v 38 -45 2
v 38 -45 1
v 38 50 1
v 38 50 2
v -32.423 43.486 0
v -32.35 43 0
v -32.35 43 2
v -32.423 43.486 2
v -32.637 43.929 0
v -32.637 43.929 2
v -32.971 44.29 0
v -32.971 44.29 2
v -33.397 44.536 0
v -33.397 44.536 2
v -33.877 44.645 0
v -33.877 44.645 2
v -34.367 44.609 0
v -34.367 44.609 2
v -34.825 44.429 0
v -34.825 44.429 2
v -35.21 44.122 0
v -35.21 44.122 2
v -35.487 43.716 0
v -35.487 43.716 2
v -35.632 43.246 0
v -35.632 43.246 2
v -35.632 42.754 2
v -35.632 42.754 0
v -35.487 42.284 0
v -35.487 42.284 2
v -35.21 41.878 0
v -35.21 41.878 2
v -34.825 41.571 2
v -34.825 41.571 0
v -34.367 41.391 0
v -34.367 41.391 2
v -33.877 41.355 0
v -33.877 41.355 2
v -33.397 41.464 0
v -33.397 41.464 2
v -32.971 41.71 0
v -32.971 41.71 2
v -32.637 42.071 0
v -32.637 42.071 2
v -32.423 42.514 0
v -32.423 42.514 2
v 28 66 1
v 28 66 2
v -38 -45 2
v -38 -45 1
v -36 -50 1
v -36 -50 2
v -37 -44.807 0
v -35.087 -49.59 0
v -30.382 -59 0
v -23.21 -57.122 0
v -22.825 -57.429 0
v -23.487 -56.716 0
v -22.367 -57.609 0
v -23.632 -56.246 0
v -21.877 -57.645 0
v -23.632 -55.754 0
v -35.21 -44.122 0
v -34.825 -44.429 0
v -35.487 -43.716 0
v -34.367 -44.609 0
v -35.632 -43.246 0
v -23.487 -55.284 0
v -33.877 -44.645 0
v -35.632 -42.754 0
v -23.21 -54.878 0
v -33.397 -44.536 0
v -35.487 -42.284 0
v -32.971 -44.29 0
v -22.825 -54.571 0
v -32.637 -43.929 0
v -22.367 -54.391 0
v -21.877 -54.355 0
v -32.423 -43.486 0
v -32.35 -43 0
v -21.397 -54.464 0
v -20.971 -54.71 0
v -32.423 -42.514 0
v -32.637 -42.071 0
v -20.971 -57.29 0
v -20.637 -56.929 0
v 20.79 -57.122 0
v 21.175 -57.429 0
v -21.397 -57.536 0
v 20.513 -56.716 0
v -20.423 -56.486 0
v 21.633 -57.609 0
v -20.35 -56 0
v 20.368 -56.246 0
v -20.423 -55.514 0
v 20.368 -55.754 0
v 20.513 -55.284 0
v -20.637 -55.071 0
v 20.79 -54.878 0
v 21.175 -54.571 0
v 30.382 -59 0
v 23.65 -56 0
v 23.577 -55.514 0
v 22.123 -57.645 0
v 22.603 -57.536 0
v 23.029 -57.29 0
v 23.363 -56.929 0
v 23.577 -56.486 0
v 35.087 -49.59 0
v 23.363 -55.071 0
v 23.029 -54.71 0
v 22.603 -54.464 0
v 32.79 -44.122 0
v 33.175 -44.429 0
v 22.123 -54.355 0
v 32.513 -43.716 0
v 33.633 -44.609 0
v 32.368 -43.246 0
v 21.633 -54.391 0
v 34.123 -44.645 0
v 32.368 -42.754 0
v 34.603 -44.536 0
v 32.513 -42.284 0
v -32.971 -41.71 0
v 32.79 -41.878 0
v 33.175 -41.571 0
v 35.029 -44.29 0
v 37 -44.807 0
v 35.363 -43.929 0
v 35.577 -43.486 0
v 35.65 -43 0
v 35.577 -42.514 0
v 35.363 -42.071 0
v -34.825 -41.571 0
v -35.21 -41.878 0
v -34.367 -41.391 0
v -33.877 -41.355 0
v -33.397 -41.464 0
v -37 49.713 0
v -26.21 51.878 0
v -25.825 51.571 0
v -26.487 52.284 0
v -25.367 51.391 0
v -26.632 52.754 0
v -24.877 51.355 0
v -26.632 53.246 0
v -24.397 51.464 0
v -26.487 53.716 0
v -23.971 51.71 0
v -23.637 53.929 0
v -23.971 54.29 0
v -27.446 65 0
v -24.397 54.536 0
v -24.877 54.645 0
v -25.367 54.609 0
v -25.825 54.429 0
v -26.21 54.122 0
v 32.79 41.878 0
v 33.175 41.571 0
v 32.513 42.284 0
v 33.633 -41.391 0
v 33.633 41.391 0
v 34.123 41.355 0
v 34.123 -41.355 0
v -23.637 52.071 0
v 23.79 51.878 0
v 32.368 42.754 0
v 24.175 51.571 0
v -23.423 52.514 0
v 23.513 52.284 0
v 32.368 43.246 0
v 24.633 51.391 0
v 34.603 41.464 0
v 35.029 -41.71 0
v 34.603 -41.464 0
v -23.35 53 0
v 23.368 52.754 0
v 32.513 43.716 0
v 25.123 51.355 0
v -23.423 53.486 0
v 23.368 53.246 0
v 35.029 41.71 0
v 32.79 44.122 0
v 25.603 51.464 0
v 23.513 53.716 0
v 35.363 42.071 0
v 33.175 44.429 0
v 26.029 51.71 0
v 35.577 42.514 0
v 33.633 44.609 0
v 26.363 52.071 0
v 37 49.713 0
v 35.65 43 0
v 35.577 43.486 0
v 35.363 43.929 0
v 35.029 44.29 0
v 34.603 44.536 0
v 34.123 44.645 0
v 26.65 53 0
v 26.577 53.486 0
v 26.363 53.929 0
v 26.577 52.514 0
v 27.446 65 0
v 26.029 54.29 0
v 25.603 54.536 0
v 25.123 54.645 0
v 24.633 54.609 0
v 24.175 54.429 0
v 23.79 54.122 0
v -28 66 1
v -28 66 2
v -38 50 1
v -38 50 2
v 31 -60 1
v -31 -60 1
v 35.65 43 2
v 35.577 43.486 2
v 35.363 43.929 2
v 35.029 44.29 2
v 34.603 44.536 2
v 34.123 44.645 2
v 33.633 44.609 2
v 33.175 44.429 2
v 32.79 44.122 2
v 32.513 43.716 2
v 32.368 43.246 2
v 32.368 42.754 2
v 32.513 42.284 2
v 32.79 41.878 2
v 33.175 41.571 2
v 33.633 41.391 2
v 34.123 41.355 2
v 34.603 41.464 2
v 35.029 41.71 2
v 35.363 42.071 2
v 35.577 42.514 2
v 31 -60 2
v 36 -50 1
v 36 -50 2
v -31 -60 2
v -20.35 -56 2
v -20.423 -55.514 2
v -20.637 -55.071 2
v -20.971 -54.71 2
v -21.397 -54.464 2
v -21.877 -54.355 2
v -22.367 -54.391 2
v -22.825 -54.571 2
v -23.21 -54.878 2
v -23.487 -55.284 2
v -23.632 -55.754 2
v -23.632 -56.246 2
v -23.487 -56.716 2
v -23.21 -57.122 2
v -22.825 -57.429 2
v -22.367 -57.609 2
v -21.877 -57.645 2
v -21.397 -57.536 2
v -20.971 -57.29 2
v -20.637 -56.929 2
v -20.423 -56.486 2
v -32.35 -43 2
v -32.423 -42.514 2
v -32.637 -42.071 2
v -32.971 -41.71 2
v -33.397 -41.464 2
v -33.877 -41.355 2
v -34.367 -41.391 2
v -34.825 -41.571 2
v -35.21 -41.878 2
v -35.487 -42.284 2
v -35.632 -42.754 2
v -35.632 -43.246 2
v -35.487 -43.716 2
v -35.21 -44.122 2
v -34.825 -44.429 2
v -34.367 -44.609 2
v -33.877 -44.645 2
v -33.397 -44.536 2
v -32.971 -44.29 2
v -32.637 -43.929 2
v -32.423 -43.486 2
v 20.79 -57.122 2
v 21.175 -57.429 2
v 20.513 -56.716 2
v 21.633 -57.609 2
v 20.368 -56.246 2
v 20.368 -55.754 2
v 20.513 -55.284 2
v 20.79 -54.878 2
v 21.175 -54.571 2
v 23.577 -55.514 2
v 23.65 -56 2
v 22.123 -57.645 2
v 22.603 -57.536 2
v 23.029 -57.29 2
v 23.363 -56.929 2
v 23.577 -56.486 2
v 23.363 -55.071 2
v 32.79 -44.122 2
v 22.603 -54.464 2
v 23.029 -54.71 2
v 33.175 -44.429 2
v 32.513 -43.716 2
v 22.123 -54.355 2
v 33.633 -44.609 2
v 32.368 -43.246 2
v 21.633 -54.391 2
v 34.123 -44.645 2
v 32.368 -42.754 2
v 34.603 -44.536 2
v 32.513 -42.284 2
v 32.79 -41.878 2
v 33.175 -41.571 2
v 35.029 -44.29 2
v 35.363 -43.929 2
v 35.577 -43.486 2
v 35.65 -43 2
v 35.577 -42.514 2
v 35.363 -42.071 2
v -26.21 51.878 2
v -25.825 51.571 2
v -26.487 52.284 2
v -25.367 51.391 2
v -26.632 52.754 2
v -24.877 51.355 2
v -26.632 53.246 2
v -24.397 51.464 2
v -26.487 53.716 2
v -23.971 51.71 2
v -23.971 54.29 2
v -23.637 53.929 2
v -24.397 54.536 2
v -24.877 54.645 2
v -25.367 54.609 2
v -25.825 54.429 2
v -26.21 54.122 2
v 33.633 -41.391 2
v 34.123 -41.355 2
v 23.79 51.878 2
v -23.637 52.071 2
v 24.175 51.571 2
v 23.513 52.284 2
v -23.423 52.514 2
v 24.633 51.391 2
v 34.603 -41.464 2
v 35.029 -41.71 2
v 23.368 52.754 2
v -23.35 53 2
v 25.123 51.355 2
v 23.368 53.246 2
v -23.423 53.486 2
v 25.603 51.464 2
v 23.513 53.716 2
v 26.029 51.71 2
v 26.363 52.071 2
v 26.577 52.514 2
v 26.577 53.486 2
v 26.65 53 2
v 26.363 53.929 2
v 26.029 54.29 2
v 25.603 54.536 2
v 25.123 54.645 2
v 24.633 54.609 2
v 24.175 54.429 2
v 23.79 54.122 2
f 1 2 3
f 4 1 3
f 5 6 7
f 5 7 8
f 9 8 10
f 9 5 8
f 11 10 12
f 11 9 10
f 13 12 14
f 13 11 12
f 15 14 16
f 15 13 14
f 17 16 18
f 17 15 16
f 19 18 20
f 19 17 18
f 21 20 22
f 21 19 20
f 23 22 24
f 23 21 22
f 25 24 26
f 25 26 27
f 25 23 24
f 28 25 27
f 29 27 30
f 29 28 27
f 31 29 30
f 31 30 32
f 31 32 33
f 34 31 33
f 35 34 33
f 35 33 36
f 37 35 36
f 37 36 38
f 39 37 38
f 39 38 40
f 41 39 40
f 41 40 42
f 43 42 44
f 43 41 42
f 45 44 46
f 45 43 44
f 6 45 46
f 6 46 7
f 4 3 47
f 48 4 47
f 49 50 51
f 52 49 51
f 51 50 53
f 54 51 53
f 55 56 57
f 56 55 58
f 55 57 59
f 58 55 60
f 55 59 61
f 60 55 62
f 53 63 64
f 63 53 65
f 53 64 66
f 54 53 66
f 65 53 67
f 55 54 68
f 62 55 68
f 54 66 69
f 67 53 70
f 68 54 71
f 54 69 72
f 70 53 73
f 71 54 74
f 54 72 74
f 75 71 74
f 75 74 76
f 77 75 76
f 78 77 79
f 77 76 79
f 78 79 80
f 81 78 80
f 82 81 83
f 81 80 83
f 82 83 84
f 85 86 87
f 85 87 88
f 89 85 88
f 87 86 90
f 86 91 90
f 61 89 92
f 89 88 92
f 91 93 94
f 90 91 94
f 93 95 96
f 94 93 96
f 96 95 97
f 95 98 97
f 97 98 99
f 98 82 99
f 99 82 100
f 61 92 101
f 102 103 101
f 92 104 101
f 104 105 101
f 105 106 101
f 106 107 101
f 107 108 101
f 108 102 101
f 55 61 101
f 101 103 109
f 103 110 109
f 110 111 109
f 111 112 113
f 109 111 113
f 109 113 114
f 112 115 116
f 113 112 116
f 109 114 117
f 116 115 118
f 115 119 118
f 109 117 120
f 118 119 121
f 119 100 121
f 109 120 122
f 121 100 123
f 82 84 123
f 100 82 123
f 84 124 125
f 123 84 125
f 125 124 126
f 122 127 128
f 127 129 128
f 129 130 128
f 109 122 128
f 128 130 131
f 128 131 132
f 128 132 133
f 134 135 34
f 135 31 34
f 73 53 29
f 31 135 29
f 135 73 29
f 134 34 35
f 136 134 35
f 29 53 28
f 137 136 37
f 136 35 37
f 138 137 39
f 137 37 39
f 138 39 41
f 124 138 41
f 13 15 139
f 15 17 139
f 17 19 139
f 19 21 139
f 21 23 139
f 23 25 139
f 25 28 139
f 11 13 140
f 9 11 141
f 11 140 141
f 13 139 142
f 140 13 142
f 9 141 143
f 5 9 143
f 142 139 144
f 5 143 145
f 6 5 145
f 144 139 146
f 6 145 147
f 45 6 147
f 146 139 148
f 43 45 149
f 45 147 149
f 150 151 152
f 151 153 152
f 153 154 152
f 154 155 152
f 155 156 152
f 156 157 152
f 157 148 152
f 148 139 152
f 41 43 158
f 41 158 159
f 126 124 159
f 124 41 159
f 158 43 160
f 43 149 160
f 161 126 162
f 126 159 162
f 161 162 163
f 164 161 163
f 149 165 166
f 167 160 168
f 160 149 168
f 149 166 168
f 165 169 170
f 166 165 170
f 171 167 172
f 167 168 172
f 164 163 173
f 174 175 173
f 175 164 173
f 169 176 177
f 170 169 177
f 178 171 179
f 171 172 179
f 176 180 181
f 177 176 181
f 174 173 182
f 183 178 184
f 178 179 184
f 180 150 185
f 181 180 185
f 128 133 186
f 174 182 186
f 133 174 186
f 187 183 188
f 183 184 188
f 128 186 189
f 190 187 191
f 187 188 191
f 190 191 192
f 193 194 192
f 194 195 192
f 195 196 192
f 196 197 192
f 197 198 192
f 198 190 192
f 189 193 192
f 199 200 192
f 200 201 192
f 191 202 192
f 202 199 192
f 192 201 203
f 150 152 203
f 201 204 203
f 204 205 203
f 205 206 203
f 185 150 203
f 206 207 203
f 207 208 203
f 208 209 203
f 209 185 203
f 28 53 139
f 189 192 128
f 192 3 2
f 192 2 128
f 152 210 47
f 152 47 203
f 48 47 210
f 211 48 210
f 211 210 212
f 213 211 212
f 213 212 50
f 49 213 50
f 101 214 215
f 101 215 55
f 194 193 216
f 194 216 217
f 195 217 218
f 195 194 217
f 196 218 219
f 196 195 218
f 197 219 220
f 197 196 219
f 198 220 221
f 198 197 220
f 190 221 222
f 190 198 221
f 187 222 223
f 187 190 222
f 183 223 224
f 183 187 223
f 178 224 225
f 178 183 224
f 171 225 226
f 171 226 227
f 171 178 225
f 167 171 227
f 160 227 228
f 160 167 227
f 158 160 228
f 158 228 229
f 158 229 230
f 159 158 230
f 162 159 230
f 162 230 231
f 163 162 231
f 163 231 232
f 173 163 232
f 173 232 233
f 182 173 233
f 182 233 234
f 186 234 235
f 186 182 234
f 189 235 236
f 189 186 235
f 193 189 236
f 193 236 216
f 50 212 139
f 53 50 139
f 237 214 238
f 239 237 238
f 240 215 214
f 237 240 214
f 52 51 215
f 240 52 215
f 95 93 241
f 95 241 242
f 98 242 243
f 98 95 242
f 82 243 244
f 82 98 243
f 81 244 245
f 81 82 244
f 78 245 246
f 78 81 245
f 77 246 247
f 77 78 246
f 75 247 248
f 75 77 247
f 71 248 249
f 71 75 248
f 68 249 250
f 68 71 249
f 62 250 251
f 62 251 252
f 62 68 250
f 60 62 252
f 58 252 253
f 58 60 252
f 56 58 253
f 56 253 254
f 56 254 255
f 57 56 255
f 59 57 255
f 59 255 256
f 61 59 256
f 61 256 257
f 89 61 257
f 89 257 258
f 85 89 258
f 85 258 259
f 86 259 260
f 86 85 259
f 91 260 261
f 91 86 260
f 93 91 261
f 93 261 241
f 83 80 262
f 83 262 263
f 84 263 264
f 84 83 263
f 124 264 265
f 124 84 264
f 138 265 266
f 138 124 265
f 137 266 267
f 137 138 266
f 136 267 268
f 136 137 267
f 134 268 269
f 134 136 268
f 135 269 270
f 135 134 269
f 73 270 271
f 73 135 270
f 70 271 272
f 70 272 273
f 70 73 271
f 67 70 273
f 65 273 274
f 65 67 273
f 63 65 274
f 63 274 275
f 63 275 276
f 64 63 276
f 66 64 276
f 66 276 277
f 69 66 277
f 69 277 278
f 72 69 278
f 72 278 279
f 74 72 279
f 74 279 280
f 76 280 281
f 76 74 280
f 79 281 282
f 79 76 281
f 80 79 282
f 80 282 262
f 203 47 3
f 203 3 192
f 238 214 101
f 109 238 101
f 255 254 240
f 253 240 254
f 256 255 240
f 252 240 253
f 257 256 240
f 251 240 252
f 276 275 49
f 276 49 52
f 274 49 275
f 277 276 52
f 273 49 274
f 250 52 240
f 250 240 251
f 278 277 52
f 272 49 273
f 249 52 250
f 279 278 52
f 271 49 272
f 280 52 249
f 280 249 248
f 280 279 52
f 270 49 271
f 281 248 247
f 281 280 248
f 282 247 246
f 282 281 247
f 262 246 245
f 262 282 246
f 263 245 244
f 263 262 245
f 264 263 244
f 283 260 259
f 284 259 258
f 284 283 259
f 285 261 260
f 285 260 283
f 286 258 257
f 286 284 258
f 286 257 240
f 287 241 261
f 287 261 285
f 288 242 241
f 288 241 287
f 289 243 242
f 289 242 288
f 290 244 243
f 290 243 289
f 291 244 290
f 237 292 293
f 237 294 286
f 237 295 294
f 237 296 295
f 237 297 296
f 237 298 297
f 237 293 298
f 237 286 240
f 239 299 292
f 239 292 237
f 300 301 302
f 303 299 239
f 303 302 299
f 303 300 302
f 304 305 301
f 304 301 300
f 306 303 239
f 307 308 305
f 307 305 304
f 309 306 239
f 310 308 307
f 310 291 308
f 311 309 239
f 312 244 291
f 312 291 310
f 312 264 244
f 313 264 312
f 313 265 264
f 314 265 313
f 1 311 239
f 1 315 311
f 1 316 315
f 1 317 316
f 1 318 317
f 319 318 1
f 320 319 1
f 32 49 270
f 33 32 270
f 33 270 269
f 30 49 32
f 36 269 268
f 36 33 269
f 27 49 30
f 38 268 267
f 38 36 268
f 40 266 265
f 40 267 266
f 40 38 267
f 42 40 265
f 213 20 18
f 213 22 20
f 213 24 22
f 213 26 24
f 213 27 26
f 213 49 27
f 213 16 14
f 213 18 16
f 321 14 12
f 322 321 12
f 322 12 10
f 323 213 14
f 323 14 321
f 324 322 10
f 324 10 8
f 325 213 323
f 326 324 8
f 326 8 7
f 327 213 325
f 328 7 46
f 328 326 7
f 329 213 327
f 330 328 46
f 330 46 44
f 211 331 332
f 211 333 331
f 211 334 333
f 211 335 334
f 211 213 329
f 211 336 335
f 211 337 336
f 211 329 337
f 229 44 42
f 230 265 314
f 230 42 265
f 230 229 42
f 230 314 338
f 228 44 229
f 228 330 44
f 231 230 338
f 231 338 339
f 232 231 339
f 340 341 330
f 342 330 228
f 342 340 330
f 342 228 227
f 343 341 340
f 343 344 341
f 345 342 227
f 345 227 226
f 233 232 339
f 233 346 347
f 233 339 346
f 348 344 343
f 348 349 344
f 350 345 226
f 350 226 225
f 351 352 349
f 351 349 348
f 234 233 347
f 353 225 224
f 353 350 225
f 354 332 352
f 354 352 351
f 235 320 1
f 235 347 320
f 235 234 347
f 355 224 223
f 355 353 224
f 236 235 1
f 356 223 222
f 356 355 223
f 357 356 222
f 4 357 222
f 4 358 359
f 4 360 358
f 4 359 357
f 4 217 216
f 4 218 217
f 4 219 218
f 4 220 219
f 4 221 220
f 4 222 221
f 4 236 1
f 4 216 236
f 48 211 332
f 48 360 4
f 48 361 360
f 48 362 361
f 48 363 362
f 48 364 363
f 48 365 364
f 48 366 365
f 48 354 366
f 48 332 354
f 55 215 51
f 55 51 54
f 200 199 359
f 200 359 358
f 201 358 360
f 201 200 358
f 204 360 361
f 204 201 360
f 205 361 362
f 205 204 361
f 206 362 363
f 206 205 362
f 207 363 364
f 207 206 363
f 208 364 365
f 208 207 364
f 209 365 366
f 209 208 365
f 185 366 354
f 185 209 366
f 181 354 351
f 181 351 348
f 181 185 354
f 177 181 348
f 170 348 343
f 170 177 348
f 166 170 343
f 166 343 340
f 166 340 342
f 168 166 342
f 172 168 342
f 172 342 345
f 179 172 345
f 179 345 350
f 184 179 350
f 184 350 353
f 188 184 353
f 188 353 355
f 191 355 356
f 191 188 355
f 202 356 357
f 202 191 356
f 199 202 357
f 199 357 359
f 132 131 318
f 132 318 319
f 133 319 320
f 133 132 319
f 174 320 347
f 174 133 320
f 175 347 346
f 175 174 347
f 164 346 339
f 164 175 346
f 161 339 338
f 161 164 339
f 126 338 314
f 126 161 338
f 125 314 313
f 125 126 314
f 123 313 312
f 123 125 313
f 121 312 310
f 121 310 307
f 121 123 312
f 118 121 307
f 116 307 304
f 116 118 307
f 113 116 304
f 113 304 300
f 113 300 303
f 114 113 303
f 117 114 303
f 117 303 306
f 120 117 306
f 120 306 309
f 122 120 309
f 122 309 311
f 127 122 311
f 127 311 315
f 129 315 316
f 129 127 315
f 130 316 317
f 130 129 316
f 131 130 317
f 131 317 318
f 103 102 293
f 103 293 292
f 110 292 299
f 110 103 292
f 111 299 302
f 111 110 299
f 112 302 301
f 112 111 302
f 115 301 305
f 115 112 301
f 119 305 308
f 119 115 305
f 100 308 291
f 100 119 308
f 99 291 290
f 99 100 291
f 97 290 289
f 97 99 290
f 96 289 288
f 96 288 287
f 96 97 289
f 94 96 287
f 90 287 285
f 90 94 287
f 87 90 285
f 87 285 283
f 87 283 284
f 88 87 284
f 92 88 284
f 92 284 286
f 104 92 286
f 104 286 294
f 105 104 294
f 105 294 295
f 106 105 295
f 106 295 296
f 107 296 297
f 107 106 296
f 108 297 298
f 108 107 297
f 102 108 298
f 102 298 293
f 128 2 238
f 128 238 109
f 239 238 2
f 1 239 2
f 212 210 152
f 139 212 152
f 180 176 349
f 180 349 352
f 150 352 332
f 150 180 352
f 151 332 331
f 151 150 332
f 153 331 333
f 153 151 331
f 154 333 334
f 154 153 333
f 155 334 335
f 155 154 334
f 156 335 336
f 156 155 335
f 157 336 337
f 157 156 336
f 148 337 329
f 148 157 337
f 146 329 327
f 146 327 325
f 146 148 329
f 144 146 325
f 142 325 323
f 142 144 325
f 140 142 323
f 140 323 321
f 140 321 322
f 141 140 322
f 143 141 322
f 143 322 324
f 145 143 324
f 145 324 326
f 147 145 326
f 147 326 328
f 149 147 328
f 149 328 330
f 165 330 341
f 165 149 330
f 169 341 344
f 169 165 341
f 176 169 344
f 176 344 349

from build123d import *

# Parameters (mm, degrees)
SKETCH_3_R        = 1.65
EXTRUDE_242_DEPTH = 2
CHAMFER_C1_SIZE   = 1


with BuildPart() as part:
    # 草图3 → Extrude 242 (new body)
    with BuildSketch(Plane.XY):
        Polygon((-31, -60), (31, -60), (36, -50), (38, -45), (38, 50), (28, 66), (-28, 66), (-38, 50), (-38, -45), (-36, -50), align=None)
        with Locations((-22, -56)):
            Circle(SKETCH_3_R, mode=Mode.SUBTRACT)
        with Locations((-25, 53)):
            Circle(SKETCH_3_R, mode=Mode.SUBTRACT)
        with Locations((-34, -43)):
            Circle(SKETCH_3_R, mode=Mode.SUBTRACT)
        with Locations((-34, 43)):
            Circle(SKETCH_3_R, mode=Mode.SUBTRACT)
        with Locations((22, -56)):
            Circle(SKETCH_3_R, mode=Mode.SUBTRACT)
        with Locations((25, 53)):
            Circle(SKETCH_3_R, mode=Mode.SUBTRACT)
        with Locations((34, -43)):
            Circle(SKETCH_3_R, mode=Mode.SUBTRACT)
        with Locations((34, 43)):
            Circle(SKETCH_3_R, mode=Mode.SUBTRACT)
    extrude(amount=EXTRUDE_242_DEPTH)

    # 底盖全周向心倒角_C1
    # the kernel refuses this chamfer: 1 mm, written as the material it takes off along each edge
    with BuildSketch(Plane(origin=(-38.955099084, -42.612252289, 0), x_dir=(-0.02552928052838921, -0.010211712211355682, 0.9996219169112968), z_dir=(0.3713906763541037, -0.9284766908852594, 0)), Plane(origin=(35.044900916, -52.387747711, 0), x_dir=(0.025529280528384445, -0.010211712211353776, 0.9996219169112968), z_dir=(0.3713906763541037, 0.9284766908852594, 0))) as chamfer_c1_piece_1:
        Polygon((CHAMFER_C1_SIZE * 0.999621916911, -CHAMFER_C1_SIZE * 0.0274958766106), (-CHAMFER_C1_SIZE * 0.0274958766106, -CHAMFER_C1_SIZE * 0.999621916911), (0, 0), align=None)
    extrude(amount=10.528530783, mode=Mode.SUBTRACT)
    with BuildSketch(Plane(origin=(-38, 52.571682988, 0), x_dir=(-0.02749587661058908, 0, 0.9996219169112968), z_dir=(0, -1, 0)), Plane(origin=(38, -47.571682988, 0), x_dir=(0.02749587661058908, 0, 0.9996219169112968), z_dir=(0, 1, 0))) as chamfer_c1_piece_2:
        Polygon((CHAMFER_C1_SIZE * 0.999621916911, -CHAMFER_C1_SIZE * 0.0274958766106), (-CHAMFER_C1_SIZE * 0.0274958766106, -CHAMFER_C1_SIZE * 0.999621916911), (0, 0), align=None)
    extrude(amount=100.143365976, mode=Mode.SUBTRACT)
    with BuildSketch(Plane(origin=(-26.637010742, 68.180782812, 0), x_dir=(-0.023316456732911925, 0.014572785458069957, 0.9996219169112968), z_dir=(-0.52999894000318, -0.847998304005088, 0)), Plane(origin=(39.362989258, 47.819217188, 0), x_dir=(0.023316456732909444, 0.014572785458068402, 0.9996219169112968), z_dir=(-0.52999894000318, 0.847998304005088, 0))) as chamfer_c1_piece_3:
        Polygon((CHAMFER_C1_SIZE * 0.999621916911, -CHAMFER_C1_SIZE * 0.0274958766106), (-CHAMFER_C1_SIZE * 0.0274958766106, -CHAMFER_C1_SIZE * 0.999621916911), (0, 0), align=None)
    extrude(amount=24.01132824, mode=Mode.SUBTRACT)
    with BuildSketch(Plane(origin=(30.571682988, 66, 0), x_dir=(0, 0.027495876610582174, 0.9996219169112968), z_dir=(-1, 0, 0))) as chamfer_c1_piece_4:
        Polygon((CHAMFER_C1_SIZE * 0.999621916911, -CHAMFER_C1_SIZE * 0.0274958766106), (-CHAMFER_C1_SIZE * 0.0274958766106, -CHAMFER_C1_SIZE * 0.999621916911), (0, 0), align=None)
    extrude(amount=61.143365976, mode=Mode.SUBTRACT)
    with BuildSketch(Plane(origin=(29.849908404, -62.300183191, 0), x_dir=(0.02459305968088644, -0.01229652984044322, 0.9996219169112968), z_dir=(0.447213595499958, 0.894427190999916, 0)), Plane(origin=(-37.150091596, -47.699816809, 0), x_dir=(-0.024593059680886434, -0.012296529840443217, 0.9996219169112968), z_dir=(0.447213595499958, -0.894427190999916, 0))) as chamfer_c1_piece_5:
        Polygon((CHAMFER_C1_SIZE * 0.999621916911, -CHAMFER_C1_SIZE * 0.0274958766106), (-CHAMFER_C1_SIZE * 0.0274958766106, -CHAMFER_C1_SIZE * 0.999621916911), (0, 0), align=None)
    extrude(amount=16.323705863, mode=Mode.SUBTRACT)
    with BuildSketch(Plane(origin=(-33.571682988, -60, 0), x_dir=(0, -0.02749587661058908, 0.9996219169112968), z_dir=(1, 0, 0))) as chamfer_c1_piece_6:
        Polygon((CHAMFER_C1_SIZE * 0.999621916911, -CHAMFER_C1_SIZE * 0.0274958766106), (-CHAMFER_C1_SIZE * 0.0274958766106, -CHAMFER_C1_SIZE * 0.999621916911), (0, 0), align=None)
    extrude(amount=67.143365976, mode=Mode.SUBTRACT)


solid = part.part
